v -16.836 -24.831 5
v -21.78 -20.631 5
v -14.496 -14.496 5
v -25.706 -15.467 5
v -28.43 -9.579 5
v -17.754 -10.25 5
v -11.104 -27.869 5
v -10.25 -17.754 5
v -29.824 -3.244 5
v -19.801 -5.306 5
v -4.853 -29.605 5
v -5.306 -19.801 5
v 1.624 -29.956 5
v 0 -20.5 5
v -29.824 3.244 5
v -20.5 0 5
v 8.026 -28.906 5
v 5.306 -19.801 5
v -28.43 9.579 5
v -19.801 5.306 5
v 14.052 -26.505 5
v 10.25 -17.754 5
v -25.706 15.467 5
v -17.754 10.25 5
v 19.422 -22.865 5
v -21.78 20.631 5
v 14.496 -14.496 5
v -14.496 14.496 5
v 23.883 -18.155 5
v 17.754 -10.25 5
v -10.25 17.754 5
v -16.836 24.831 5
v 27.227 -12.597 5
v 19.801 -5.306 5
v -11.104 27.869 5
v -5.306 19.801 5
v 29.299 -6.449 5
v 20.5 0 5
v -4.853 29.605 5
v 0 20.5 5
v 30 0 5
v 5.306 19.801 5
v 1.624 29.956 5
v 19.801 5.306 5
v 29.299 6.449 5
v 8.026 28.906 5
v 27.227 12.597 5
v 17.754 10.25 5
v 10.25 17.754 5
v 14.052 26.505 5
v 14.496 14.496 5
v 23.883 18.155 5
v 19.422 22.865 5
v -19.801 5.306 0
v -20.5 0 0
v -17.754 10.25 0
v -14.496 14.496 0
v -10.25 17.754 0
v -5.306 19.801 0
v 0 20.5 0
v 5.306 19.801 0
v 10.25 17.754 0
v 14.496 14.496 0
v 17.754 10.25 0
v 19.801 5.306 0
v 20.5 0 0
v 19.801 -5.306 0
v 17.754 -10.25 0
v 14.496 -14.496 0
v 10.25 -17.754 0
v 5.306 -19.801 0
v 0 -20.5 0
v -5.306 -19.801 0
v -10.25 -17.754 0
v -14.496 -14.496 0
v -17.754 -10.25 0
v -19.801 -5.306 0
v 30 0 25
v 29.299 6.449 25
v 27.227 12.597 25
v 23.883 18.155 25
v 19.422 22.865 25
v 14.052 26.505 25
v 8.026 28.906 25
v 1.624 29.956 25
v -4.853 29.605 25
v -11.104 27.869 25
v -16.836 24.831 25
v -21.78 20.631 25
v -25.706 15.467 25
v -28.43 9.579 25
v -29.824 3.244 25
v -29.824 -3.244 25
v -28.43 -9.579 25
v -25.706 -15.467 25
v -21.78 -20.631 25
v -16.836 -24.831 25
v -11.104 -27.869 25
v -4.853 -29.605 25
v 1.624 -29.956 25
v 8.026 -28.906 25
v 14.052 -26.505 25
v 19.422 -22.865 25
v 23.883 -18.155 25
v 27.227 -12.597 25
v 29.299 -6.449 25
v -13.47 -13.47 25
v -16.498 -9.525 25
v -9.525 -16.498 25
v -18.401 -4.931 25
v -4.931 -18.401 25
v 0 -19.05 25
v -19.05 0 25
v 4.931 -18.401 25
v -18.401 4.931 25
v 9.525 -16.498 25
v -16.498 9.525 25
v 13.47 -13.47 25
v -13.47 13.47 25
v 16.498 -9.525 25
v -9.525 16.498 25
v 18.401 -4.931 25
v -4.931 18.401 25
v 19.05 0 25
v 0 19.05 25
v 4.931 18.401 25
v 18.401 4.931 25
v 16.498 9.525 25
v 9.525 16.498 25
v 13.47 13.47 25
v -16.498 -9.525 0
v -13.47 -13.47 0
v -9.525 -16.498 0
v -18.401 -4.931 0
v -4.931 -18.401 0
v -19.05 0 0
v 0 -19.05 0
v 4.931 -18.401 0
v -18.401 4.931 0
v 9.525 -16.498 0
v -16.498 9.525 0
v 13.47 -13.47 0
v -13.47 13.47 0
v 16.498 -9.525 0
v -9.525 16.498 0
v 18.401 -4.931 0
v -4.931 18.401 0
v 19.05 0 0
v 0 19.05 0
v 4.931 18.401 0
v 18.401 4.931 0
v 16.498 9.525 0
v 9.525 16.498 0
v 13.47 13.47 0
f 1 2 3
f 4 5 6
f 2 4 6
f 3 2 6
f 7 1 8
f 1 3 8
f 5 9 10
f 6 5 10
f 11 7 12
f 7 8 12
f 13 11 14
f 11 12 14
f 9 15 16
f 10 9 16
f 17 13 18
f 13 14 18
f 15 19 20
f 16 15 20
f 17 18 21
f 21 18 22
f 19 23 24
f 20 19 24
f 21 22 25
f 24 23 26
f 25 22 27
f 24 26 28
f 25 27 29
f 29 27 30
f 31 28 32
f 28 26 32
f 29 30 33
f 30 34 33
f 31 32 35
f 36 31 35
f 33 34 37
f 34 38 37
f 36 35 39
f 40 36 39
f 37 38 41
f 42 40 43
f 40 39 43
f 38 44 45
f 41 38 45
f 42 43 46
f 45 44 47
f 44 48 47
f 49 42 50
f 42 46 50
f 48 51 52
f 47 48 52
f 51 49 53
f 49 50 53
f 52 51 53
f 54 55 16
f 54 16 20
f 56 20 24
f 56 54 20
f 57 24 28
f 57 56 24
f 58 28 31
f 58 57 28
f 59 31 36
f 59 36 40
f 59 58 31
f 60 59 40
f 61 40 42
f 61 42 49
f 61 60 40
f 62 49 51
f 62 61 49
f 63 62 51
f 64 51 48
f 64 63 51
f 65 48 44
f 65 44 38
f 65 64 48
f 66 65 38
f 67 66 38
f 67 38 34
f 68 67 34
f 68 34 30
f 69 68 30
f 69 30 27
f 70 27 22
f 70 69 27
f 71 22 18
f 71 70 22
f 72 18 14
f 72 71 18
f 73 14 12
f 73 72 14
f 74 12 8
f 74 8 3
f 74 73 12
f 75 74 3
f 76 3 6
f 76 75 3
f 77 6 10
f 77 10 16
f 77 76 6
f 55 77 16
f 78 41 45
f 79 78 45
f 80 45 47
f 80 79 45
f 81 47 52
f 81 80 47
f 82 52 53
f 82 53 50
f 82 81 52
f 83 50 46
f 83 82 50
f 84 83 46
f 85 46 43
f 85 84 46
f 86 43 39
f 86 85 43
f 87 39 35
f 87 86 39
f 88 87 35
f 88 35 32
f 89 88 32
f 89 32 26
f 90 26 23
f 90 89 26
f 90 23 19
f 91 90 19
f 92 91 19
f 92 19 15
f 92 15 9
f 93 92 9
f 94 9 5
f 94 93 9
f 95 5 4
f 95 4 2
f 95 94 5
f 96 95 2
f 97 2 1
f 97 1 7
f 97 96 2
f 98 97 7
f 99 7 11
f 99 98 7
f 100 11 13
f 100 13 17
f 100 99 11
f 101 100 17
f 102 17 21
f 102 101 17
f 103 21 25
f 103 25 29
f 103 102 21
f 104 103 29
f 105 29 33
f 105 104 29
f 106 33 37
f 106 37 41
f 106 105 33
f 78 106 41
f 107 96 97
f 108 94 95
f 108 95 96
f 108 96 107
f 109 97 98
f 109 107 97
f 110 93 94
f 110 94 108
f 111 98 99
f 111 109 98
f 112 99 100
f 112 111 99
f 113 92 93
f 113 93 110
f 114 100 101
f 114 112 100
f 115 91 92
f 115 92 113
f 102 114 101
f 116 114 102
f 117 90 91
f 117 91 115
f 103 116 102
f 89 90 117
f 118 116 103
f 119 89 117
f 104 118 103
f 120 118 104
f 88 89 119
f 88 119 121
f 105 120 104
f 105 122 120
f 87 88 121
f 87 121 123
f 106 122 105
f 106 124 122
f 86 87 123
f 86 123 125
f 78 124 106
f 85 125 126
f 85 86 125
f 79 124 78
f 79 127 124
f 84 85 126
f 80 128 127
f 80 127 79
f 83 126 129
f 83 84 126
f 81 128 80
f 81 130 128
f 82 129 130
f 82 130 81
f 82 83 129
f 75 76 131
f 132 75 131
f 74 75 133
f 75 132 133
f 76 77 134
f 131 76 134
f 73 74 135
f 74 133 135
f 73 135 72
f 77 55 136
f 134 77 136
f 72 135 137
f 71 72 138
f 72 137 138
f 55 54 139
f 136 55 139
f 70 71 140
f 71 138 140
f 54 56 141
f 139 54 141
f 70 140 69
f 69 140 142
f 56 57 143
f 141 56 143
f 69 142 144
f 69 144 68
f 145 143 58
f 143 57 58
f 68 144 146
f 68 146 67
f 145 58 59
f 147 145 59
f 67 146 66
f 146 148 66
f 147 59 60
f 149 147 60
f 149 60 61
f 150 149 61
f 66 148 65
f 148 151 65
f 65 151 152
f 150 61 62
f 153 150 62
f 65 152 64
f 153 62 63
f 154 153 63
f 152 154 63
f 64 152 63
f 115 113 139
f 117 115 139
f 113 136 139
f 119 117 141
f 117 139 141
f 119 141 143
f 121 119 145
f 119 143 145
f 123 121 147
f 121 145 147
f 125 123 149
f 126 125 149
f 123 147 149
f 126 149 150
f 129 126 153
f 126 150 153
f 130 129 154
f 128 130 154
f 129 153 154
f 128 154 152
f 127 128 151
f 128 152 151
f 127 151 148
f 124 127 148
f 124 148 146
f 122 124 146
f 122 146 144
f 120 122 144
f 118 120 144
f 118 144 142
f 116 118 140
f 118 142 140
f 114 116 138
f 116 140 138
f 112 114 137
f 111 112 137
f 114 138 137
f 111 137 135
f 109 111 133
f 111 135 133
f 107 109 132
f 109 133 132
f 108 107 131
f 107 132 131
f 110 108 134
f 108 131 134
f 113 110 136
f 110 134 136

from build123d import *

# Parameters (mm, degrees)
CROQUIS1_R              = 23.05
SALIENTE_EXTRUIR1_DEPTH = 25
CROQUIS2_R              = 19.05
CORTAR_EXTRUIR1_DEPTH   = 29
CROQUIS3_R              = 23.05
CROQUIS3_R_2            = 20.5
CORTAR_EXTRUIR2_DEPTH   = 5
CROQUIS4_R              = 30
SALIENTE_EXTRUIR3_DEPTH = 20
CROQUIS5_R              = 19.05
CORTAR_EXTRUIR3_DEPTH   = 20


with BuildPart() as part:
    # Croquis1 → Saliente-Extruir1 (new body)
    with BuildSketch(Plane.XY):
        Circle(CROQUIS1_R)
    extrude(amount=SALIENTE_EXTRUIR1_DEPTH)

    # Croquis2 → Cortar-Extruir1 (cut)
    with BuildSketch(Plane(origin=(0, 0, 0), x_dir=(-1, 0, 0), z_dir=(0, 0, -1))):
        Circle(CROQUIS2_R)
    extrude(amount=-CORTAR_EXTRUIR1_DEPTH, mode=Mode.SUBTRACT)

    # Croquis3 → Cortar-Extruir2 (cut)
    with BuildSketch(Plane(origin=(0, 0, 0), x_dir=(-1, 0, 0), z_dir=(0, 0, -1))):
        Circle(CROQUIS3_R)
        Circle(CROQUIS3_R_2, mode=Mode.SUBTRACT)
    extrude(amount=-CORTAR_EXTRUIR2_DEPTH, mode=Mode.SUBTRACT)

    # Croquis4 → Saliente-Extruir3 (add)
    with BuildSketch(Plane.XY.offset(25)):
        Circle(CROQUIS4_R)
    extrude(amount=-SALIENTE_EXTRUIR3_DEPTH)

    # Croquis5 → Cortar-Extruir3 (cut)
    with BuildSketch(Plane(origin=(0, 0, 5), x_dir=(-1, 0, 0), z_dir=(0, 0, -1))):
        Circle(CROQUIS5_R)
    extrude(amount=-CORTAR_EXTRUIR3_DEPTH, mode=Mode.SUBTRACT)


solid = part.part
